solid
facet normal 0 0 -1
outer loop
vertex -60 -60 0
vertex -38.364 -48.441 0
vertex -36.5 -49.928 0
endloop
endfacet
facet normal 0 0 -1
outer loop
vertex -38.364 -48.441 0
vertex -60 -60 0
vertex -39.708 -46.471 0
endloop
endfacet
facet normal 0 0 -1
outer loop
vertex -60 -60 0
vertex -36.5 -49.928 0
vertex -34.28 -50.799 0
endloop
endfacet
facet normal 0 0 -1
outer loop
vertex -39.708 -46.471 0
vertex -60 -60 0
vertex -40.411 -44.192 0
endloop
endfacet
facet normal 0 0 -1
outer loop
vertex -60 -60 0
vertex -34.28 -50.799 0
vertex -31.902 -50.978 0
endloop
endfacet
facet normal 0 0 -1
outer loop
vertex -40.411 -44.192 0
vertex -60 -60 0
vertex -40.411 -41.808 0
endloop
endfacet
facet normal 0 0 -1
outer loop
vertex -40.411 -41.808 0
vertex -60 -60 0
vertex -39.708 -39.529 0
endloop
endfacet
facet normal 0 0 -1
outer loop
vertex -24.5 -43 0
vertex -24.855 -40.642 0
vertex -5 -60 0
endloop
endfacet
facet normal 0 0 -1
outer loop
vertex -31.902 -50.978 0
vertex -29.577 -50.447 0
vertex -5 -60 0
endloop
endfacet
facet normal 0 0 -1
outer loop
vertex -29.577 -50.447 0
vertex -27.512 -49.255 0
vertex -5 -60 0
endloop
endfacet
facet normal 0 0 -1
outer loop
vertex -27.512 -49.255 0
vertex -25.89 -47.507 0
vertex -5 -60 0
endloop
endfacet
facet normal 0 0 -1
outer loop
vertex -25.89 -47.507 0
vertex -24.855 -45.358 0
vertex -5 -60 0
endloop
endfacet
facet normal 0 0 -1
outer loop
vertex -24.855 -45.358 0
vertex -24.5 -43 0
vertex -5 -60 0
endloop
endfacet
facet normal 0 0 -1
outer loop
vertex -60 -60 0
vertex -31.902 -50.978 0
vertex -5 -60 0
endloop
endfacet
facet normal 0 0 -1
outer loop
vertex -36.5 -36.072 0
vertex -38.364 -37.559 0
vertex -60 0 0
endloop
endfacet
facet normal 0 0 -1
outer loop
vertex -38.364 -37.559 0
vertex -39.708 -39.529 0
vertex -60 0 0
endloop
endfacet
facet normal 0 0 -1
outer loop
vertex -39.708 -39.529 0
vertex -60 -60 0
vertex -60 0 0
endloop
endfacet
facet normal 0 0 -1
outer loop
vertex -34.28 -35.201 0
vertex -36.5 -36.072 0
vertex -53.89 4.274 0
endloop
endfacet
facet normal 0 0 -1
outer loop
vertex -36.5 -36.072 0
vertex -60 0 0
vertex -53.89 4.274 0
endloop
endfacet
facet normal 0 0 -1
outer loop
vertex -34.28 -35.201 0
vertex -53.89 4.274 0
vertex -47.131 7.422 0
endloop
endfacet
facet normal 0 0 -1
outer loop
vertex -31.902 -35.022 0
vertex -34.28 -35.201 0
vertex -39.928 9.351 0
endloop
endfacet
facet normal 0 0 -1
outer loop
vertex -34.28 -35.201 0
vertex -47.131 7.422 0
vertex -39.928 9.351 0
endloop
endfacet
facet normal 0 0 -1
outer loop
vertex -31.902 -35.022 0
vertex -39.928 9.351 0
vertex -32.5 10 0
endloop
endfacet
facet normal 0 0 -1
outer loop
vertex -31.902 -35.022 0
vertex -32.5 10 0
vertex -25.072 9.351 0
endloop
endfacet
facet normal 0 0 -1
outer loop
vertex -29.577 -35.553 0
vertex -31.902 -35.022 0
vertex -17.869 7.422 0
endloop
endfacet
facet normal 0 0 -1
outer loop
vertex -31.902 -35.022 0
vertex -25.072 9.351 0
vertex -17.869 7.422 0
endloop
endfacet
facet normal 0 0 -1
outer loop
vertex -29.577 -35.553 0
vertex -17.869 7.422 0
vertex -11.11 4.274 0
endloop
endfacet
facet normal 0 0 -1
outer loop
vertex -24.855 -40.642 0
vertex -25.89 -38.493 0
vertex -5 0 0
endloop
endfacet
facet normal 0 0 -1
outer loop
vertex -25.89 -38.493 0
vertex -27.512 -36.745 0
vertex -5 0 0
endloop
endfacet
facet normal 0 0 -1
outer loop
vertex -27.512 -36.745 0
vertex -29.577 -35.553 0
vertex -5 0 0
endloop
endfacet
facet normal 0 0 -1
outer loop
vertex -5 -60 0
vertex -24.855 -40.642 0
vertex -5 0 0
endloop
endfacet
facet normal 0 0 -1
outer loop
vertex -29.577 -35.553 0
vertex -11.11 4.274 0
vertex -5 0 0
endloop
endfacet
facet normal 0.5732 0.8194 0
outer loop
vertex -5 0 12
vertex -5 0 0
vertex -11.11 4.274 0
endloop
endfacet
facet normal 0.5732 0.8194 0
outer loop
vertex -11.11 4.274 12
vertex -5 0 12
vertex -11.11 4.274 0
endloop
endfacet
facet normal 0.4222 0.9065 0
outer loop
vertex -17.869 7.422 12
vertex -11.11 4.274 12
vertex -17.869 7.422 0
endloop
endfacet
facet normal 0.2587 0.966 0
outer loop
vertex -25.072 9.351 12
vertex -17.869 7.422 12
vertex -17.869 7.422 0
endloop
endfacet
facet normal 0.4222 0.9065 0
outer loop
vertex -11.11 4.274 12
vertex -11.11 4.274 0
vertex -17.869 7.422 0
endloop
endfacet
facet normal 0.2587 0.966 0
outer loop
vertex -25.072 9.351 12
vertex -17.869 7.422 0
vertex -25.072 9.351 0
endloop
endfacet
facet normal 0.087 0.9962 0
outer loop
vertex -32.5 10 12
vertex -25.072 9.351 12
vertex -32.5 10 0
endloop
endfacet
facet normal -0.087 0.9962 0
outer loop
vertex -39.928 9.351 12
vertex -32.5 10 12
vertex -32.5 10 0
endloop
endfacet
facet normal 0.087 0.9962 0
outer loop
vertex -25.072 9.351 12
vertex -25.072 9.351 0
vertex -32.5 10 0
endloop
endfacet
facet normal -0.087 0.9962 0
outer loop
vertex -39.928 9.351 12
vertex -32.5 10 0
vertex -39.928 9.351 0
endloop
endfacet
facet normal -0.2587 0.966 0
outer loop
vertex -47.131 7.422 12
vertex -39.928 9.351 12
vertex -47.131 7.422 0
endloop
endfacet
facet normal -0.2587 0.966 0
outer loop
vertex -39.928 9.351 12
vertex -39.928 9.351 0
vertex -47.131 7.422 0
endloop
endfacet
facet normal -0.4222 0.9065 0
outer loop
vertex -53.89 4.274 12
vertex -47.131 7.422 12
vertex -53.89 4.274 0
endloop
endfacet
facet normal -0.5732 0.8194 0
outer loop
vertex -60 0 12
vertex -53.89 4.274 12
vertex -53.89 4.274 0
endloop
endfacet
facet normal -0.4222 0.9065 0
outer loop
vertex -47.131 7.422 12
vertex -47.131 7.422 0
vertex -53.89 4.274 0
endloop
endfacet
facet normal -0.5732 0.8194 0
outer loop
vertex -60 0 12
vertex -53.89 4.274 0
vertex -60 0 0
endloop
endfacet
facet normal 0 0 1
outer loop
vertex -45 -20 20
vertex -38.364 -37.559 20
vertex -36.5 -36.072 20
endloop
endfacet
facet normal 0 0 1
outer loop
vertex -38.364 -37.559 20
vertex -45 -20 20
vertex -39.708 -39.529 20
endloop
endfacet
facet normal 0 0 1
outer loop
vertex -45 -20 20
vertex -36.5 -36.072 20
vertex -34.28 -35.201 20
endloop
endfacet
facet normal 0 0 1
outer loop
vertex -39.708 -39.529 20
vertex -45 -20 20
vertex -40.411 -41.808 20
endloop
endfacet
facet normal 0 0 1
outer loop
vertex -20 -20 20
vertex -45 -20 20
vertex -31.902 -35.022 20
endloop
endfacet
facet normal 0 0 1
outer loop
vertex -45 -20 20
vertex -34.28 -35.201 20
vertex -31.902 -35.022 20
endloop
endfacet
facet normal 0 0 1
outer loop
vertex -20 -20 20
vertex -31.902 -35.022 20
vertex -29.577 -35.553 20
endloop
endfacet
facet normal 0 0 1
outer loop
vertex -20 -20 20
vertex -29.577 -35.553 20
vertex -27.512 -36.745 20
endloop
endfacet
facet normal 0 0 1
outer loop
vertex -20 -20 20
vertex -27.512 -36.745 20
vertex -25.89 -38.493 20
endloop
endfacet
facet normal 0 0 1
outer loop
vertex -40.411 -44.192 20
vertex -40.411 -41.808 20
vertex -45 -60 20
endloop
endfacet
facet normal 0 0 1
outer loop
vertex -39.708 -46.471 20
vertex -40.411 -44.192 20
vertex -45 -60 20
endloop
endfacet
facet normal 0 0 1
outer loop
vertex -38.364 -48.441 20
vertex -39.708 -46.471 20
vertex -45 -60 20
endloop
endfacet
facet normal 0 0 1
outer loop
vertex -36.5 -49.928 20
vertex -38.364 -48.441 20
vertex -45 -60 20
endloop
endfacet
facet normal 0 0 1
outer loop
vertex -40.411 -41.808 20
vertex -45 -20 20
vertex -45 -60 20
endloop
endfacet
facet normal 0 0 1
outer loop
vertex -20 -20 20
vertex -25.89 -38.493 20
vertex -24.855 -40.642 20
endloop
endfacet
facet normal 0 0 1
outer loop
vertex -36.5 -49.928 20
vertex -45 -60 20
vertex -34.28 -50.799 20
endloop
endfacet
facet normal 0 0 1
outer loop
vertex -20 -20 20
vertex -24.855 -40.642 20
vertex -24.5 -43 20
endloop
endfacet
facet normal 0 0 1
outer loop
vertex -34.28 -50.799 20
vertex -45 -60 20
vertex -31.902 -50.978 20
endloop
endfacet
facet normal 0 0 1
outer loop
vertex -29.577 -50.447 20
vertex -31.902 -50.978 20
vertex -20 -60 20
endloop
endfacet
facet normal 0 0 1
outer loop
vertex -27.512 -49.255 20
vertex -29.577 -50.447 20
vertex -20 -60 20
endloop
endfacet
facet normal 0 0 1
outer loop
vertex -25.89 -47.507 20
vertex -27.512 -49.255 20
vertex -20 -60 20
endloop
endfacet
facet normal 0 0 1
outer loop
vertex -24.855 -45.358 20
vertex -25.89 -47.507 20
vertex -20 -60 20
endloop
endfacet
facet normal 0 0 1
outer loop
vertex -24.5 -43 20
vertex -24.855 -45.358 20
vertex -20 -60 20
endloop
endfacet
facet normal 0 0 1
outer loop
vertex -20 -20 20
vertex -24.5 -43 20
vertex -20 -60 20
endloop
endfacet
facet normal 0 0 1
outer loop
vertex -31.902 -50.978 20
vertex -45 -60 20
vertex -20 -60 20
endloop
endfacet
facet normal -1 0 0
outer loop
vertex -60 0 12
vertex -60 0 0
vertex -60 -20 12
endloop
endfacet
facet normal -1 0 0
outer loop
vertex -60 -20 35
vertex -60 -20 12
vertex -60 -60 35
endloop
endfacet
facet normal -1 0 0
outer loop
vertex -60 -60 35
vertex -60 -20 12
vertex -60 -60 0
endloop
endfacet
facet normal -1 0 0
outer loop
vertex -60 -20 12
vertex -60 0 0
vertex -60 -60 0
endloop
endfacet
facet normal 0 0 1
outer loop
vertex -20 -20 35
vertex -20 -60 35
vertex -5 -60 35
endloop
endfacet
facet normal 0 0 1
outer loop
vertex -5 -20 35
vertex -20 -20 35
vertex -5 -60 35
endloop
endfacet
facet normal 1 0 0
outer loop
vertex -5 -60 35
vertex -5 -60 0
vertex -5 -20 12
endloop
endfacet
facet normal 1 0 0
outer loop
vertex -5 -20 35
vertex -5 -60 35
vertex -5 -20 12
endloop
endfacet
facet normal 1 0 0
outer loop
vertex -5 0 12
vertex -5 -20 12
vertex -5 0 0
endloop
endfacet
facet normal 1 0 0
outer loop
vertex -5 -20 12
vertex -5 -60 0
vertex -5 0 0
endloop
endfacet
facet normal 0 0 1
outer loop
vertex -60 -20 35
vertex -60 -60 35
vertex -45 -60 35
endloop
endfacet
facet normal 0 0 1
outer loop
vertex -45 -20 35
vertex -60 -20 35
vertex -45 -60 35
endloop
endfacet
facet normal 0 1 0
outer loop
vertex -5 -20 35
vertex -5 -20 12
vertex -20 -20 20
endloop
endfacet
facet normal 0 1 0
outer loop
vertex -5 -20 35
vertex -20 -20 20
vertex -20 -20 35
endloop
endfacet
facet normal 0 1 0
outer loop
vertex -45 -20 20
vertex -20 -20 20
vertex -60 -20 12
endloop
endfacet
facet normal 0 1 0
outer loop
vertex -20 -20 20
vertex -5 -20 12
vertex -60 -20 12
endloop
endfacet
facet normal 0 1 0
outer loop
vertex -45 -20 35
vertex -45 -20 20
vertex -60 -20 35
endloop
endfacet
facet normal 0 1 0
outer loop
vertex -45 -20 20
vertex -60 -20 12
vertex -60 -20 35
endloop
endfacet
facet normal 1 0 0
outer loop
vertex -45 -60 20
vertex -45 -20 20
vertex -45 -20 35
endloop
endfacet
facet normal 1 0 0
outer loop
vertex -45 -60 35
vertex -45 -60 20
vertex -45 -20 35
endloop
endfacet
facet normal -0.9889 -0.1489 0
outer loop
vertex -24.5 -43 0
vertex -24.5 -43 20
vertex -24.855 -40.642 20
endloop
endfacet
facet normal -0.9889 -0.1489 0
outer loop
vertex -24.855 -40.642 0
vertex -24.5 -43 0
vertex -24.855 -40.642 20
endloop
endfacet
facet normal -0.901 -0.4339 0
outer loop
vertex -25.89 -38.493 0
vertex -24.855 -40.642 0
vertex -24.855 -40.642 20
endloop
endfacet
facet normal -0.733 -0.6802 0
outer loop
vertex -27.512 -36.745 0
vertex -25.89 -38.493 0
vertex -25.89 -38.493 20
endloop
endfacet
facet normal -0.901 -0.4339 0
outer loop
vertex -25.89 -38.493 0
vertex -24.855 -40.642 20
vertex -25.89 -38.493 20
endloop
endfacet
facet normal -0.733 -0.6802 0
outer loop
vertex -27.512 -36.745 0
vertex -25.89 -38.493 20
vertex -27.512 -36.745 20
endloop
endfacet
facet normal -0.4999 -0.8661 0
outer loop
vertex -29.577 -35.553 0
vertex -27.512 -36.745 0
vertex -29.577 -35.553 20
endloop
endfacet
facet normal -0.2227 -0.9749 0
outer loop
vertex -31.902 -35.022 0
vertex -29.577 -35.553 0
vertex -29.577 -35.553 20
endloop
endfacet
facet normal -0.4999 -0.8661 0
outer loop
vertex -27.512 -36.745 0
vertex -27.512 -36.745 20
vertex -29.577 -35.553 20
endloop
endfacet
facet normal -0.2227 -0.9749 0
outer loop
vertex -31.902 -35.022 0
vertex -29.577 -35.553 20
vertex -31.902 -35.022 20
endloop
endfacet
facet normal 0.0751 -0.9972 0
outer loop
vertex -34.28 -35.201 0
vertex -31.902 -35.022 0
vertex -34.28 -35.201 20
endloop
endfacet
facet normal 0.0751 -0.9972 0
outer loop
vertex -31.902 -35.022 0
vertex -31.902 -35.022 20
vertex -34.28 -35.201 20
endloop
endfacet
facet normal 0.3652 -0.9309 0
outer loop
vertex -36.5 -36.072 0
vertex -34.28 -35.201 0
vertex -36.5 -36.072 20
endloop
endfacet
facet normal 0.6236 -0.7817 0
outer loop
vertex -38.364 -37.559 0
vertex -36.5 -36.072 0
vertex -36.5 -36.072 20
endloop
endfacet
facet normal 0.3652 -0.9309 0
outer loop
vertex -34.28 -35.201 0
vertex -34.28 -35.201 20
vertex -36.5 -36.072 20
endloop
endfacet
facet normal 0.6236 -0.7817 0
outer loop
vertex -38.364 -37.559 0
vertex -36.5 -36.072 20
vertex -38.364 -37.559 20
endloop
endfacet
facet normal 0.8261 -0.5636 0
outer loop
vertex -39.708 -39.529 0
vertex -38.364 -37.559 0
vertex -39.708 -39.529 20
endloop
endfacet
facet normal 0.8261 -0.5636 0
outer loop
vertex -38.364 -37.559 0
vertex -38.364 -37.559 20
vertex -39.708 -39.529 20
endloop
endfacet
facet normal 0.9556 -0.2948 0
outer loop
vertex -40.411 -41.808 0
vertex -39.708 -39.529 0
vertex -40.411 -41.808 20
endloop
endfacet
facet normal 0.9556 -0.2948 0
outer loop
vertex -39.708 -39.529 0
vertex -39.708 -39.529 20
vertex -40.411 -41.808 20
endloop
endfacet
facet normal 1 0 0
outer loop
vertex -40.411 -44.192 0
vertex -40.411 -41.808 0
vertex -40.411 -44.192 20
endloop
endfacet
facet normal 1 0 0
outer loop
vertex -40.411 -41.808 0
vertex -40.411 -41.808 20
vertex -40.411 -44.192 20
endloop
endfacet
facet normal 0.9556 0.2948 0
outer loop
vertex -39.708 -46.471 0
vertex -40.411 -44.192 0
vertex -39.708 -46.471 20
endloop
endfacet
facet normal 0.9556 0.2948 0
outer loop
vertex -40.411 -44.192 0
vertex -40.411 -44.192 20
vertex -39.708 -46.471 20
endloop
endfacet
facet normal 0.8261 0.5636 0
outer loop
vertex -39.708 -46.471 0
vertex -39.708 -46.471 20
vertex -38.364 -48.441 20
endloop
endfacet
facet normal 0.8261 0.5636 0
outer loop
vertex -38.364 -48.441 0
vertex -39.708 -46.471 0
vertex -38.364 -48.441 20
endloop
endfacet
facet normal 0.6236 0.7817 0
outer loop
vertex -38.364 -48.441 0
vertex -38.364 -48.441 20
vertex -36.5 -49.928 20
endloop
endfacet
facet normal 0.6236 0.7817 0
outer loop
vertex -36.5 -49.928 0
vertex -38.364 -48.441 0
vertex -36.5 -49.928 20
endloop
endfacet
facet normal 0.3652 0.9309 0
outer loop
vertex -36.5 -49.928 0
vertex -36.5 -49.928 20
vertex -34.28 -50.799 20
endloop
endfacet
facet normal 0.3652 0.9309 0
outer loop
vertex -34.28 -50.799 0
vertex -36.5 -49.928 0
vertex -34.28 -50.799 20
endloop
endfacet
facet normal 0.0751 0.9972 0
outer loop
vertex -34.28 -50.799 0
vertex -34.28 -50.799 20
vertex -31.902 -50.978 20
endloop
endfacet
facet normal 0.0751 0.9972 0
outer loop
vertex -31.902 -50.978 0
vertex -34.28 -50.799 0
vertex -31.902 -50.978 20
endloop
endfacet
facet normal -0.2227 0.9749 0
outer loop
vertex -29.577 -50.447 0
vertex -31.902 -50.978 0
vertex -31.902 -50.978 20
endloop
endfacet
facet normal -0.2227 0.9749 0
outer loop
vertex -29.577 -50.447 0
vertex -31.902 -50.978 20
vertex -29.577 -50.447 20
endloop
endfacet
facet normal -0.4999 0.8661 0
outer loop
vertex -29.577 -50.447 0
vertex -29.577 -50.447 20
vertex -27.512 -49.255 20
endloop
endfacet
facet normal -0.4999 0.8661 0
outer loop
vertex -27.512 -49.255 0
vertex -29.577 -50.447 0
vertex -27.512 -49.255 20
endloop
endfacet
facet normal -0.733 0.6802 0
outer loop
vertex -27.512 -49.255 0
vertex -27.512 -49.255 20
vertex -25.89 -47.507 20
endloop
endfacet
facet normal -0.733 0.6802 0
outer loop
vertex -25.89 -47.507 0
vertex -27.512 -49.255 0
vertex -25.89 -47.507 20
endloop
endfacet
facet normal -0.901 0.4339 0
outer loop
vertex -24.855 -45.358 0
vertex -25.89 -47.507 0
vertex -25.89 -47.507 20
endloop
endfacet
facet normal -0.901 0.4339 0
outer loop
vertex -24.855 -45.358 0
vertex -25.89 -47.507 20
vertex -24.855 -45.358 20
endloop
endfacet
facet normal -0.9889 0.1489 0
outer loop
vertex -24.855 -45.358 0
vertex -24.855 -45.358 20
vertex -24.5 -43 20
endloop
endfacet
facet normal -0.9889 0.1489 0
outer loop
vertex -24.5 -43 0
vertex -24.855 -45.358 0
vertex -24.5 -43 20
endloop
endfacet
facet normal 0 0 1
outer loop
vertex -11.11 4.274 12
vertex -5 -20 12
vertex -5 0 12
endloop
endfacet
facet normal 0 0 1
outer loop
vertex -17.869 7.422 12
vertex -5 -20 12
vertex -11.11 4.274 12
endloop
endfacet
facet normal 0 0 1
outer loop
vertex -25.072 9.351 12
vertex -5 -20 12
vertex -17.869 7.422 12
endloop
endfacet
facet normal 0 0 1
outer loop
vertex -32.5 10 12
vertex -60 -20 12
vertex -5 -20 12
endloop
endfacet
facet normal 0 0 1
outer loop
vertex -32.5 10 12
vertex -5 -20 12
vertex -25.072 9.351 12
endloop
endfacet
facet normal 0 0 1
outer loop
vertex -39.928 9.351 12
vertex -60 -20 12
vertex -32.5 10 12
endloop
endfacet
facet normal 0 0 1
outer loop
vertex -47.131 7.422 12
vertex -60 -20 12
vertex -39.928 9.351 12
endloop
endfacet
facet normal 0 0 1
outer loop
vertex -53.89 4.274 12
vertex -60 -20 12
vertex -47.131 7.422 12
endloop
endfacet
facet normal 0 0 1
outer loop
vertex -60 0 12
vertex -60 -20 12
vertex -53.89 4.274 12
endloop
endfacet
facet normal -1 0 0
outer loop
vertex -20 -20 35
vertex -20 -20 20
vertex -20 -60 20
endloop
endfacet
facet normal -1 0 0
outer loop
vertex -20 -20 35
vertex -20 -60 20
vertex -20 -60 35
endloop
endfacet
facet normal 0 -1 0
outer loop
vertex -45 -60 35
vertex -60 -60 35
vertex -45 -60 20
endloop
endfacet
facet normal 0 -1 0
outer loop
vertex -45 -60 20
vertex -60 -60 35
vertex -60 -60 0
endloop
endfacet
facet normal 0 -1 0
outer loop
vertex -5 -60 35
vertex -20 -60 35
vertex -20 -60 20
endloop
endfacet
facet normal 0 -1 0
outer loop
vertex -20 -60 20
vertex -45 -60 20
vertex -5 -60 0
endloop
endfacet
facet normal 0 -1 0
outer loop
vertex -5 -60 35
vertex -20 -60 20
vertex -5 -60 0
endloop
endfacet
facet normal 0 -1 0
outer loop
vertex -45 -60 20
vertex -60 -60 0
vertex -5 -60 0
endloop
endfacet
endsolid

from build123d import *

# Parameters (mm, degrees)
BASE_EXTRUSION_DEPTH    = 35
ESQUISSE5_W             = 30
ESQUISSE5_H             = 30
ENL_V_MAT_EXTRU_5_DEPTH = 89.600225733
ESQUISSE6_W             = 25
ESQUISSE6_H             = 20
ENL_V_MAT_EXTRU_6_DEPTH = 99.615414617
ESQUISSE7_R             = 8
ENL_V_MAT_EXTRU_7_DEPTH = 88.177978871


with BuildPart() as part:
    # Esquisse1 → Base-Extrusion (new body)
    with BuildSketch(Plane.XY):
        with BuildLine():
            Line((-60, 0), (-60, -60))
            Line((-60, -60), (-5, -60))
            Line((-5, -60), (-5, 0))
            ThreePointArc((-5, 0), (-32.5, 10), (-60, 0))
        make_face()
    extrude(amount=BASE_EXTRUSION_DEPTH)

    # Esquisse5 → Enlèv. mat.-Extru.5 (cut, through all)
    with BuildSketch(Plane.ZY.offset(60)):
        with Locations((27, -5)):
            Rectangle(ESQUISSE5_W, ESQUISSE5_H)
    extrude(amount=-ENL_V_MAT_EXTRU_5_DEPTH, mode=Mode.SUBTRACT)

    # Esquisse6 → Enlèv. mat.-Extru.6 (cut, through all)
    with BuildSketch(Plane.XZ.offset(60)):
        with Locations((-32.5, 30)):
            Rectangle(ESQUISSE6_W, ESQUISSE6_H)
    extrude(amount=-ENL_V_MAT_EXTRU_6_DEPTH, mode=Mode.SUBTRACT)

    # Esquisse7 → Enlèv. mat.-Extru.7 (cut, through all)
    with BuildSketch(Plane.XY.offset(20)):
        with Locations((-32.5, -43)):
            Circle(ESQUISSE7_R)
    extrude(amount=-ENL_V_MAT_EXTRU_7_DEPTH, mode=Mode.SUBTRACT)


solid = part.part
